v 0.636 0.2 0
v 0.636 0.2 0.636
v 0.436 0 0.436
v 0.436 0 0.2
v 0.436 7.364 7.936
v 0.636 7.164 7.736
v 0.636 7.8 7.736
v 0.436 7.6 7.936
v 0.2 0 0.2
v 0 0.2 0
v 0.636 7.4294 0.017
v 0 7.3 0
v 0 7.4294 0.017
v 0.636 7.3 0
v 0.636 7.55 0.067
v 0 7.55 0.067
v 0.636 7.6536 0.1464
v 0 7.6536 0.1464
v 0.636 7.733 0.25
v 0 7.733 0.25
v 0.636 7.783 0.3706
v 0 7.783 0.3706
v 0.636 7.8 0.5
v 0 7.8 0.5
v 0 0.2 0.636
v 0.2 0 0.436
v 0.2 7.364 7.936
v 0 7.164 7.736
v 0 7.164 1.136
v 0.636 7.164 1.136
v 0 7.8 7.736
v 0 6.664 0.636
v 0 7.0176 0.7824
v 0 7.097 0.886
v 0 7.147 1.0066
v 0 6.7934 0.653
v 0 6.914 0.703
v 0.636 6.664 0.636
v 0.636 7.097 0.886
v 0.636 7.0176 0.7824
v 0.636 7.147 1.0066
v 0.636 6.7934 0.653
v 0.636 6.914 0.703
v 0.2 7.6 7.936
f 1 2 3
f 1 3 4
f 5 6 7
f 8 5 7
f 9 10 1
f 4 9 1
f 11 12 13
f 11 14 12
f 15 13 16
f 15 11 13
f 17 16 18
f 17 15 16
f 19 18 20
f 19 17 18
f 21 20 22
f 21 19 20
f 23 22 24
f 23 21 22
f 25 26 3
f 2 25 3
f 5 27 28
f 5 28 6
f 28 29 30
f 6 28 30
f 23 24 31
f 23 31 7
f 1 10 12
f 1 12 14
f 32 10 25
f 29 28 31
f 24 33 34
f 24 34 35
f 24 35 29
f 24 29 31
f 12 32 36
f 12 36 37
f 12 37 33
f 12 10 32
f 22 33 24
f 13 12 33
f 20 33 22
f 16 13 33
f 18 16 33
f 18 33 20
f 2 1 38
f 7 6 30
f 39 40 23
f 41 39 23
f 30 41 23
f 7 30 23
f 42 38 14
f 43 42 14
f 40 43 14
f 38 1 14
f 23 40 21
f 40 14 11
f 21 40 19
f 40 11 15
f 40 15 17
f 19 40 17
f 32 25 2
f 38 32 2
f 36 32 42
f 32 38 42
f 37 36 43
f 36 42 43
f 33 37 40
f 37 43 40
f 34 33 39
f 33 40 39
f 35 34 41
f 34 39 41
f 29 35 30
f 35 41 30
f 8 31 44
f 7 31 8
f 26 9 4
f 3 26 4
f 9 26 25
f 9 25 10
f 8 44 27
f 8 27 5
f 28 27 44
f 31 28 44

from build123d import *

# Parameters (mm, degrees)
CROQUIS1_W              = 0.636
CROQUIS1_H              = 0.636
SALIENTE_EXTRUIR1_DEPTH = 7.8
CROQUIS2_W              = 0.636
CROQUIS2_H              = 0.636
SALIENTE_EXTRUIR2_DEPTH = 7.3
REDONDEO1_R             = 0.5
CHAFL_N1_SIZE           = 0.2
CHAFL_N2_SIZE           = 0.2


with BuildPart() as part:
    # Croquis1 → Saliente-Extruir1 (new body)
    with BuildSketch(Plane(origin=(0, 0, 0), x_dir=(1, 0, 0), z_dir=(0, 1, 0))):
        with Locations((0.318, -0.318)):
            Rectangle(CROQUIS1_W, CROQUIS1_H)
    extrude(amount=SALIENTE_EXTRUIR1_DEPTH)

    # Croquis2 → Saliente-Extruir2 (add)
    with BuildSketch(Plane.XY.offset(0.636)):
        with Locations((0.318, 7.482)):
            Rectangle(CROQUIS2_W, CROQUIS2_H)
    extrude(amount=SALIENTE_EXTRUIR2_DEPTH)

    # Redondeo1
    redondeo1_edges = [part.edges().sort_by_distance(p)[0] for p in [
        (0.318, 7.164, 0.636),
        (0.318, 7.8, 0),
    ]]
    fillet(redondeo1_edges, radius=REDONDEO1_R)

    # Chaflán1
    chafl_n1_edges = [part.edges().sort_by_distance(p)[0] for p in [
        (0.636, 7.482, 7.936),
        (0.318, 7.8, 7.936),
        (0, 7.482, 7.936),
        (0.318, 7.164, 7.936),
    ]]
    chamfer(chafl_n1_edges, length=CHAFL_N1_SIZE)

    # Chaflán2
    chafl_n2_edges = [part.edges().sort_by_distance(p)[0] for p in [
        (0.318, 0, 0),
        (0.636, 0, 0.318),
        (0.318, 0, 0.636),
        (0, 0, 0.318),
    ]]
    chamfer(chafl_n2_edges, length=CHAFL_N2_SIZE)


solid = part.part
